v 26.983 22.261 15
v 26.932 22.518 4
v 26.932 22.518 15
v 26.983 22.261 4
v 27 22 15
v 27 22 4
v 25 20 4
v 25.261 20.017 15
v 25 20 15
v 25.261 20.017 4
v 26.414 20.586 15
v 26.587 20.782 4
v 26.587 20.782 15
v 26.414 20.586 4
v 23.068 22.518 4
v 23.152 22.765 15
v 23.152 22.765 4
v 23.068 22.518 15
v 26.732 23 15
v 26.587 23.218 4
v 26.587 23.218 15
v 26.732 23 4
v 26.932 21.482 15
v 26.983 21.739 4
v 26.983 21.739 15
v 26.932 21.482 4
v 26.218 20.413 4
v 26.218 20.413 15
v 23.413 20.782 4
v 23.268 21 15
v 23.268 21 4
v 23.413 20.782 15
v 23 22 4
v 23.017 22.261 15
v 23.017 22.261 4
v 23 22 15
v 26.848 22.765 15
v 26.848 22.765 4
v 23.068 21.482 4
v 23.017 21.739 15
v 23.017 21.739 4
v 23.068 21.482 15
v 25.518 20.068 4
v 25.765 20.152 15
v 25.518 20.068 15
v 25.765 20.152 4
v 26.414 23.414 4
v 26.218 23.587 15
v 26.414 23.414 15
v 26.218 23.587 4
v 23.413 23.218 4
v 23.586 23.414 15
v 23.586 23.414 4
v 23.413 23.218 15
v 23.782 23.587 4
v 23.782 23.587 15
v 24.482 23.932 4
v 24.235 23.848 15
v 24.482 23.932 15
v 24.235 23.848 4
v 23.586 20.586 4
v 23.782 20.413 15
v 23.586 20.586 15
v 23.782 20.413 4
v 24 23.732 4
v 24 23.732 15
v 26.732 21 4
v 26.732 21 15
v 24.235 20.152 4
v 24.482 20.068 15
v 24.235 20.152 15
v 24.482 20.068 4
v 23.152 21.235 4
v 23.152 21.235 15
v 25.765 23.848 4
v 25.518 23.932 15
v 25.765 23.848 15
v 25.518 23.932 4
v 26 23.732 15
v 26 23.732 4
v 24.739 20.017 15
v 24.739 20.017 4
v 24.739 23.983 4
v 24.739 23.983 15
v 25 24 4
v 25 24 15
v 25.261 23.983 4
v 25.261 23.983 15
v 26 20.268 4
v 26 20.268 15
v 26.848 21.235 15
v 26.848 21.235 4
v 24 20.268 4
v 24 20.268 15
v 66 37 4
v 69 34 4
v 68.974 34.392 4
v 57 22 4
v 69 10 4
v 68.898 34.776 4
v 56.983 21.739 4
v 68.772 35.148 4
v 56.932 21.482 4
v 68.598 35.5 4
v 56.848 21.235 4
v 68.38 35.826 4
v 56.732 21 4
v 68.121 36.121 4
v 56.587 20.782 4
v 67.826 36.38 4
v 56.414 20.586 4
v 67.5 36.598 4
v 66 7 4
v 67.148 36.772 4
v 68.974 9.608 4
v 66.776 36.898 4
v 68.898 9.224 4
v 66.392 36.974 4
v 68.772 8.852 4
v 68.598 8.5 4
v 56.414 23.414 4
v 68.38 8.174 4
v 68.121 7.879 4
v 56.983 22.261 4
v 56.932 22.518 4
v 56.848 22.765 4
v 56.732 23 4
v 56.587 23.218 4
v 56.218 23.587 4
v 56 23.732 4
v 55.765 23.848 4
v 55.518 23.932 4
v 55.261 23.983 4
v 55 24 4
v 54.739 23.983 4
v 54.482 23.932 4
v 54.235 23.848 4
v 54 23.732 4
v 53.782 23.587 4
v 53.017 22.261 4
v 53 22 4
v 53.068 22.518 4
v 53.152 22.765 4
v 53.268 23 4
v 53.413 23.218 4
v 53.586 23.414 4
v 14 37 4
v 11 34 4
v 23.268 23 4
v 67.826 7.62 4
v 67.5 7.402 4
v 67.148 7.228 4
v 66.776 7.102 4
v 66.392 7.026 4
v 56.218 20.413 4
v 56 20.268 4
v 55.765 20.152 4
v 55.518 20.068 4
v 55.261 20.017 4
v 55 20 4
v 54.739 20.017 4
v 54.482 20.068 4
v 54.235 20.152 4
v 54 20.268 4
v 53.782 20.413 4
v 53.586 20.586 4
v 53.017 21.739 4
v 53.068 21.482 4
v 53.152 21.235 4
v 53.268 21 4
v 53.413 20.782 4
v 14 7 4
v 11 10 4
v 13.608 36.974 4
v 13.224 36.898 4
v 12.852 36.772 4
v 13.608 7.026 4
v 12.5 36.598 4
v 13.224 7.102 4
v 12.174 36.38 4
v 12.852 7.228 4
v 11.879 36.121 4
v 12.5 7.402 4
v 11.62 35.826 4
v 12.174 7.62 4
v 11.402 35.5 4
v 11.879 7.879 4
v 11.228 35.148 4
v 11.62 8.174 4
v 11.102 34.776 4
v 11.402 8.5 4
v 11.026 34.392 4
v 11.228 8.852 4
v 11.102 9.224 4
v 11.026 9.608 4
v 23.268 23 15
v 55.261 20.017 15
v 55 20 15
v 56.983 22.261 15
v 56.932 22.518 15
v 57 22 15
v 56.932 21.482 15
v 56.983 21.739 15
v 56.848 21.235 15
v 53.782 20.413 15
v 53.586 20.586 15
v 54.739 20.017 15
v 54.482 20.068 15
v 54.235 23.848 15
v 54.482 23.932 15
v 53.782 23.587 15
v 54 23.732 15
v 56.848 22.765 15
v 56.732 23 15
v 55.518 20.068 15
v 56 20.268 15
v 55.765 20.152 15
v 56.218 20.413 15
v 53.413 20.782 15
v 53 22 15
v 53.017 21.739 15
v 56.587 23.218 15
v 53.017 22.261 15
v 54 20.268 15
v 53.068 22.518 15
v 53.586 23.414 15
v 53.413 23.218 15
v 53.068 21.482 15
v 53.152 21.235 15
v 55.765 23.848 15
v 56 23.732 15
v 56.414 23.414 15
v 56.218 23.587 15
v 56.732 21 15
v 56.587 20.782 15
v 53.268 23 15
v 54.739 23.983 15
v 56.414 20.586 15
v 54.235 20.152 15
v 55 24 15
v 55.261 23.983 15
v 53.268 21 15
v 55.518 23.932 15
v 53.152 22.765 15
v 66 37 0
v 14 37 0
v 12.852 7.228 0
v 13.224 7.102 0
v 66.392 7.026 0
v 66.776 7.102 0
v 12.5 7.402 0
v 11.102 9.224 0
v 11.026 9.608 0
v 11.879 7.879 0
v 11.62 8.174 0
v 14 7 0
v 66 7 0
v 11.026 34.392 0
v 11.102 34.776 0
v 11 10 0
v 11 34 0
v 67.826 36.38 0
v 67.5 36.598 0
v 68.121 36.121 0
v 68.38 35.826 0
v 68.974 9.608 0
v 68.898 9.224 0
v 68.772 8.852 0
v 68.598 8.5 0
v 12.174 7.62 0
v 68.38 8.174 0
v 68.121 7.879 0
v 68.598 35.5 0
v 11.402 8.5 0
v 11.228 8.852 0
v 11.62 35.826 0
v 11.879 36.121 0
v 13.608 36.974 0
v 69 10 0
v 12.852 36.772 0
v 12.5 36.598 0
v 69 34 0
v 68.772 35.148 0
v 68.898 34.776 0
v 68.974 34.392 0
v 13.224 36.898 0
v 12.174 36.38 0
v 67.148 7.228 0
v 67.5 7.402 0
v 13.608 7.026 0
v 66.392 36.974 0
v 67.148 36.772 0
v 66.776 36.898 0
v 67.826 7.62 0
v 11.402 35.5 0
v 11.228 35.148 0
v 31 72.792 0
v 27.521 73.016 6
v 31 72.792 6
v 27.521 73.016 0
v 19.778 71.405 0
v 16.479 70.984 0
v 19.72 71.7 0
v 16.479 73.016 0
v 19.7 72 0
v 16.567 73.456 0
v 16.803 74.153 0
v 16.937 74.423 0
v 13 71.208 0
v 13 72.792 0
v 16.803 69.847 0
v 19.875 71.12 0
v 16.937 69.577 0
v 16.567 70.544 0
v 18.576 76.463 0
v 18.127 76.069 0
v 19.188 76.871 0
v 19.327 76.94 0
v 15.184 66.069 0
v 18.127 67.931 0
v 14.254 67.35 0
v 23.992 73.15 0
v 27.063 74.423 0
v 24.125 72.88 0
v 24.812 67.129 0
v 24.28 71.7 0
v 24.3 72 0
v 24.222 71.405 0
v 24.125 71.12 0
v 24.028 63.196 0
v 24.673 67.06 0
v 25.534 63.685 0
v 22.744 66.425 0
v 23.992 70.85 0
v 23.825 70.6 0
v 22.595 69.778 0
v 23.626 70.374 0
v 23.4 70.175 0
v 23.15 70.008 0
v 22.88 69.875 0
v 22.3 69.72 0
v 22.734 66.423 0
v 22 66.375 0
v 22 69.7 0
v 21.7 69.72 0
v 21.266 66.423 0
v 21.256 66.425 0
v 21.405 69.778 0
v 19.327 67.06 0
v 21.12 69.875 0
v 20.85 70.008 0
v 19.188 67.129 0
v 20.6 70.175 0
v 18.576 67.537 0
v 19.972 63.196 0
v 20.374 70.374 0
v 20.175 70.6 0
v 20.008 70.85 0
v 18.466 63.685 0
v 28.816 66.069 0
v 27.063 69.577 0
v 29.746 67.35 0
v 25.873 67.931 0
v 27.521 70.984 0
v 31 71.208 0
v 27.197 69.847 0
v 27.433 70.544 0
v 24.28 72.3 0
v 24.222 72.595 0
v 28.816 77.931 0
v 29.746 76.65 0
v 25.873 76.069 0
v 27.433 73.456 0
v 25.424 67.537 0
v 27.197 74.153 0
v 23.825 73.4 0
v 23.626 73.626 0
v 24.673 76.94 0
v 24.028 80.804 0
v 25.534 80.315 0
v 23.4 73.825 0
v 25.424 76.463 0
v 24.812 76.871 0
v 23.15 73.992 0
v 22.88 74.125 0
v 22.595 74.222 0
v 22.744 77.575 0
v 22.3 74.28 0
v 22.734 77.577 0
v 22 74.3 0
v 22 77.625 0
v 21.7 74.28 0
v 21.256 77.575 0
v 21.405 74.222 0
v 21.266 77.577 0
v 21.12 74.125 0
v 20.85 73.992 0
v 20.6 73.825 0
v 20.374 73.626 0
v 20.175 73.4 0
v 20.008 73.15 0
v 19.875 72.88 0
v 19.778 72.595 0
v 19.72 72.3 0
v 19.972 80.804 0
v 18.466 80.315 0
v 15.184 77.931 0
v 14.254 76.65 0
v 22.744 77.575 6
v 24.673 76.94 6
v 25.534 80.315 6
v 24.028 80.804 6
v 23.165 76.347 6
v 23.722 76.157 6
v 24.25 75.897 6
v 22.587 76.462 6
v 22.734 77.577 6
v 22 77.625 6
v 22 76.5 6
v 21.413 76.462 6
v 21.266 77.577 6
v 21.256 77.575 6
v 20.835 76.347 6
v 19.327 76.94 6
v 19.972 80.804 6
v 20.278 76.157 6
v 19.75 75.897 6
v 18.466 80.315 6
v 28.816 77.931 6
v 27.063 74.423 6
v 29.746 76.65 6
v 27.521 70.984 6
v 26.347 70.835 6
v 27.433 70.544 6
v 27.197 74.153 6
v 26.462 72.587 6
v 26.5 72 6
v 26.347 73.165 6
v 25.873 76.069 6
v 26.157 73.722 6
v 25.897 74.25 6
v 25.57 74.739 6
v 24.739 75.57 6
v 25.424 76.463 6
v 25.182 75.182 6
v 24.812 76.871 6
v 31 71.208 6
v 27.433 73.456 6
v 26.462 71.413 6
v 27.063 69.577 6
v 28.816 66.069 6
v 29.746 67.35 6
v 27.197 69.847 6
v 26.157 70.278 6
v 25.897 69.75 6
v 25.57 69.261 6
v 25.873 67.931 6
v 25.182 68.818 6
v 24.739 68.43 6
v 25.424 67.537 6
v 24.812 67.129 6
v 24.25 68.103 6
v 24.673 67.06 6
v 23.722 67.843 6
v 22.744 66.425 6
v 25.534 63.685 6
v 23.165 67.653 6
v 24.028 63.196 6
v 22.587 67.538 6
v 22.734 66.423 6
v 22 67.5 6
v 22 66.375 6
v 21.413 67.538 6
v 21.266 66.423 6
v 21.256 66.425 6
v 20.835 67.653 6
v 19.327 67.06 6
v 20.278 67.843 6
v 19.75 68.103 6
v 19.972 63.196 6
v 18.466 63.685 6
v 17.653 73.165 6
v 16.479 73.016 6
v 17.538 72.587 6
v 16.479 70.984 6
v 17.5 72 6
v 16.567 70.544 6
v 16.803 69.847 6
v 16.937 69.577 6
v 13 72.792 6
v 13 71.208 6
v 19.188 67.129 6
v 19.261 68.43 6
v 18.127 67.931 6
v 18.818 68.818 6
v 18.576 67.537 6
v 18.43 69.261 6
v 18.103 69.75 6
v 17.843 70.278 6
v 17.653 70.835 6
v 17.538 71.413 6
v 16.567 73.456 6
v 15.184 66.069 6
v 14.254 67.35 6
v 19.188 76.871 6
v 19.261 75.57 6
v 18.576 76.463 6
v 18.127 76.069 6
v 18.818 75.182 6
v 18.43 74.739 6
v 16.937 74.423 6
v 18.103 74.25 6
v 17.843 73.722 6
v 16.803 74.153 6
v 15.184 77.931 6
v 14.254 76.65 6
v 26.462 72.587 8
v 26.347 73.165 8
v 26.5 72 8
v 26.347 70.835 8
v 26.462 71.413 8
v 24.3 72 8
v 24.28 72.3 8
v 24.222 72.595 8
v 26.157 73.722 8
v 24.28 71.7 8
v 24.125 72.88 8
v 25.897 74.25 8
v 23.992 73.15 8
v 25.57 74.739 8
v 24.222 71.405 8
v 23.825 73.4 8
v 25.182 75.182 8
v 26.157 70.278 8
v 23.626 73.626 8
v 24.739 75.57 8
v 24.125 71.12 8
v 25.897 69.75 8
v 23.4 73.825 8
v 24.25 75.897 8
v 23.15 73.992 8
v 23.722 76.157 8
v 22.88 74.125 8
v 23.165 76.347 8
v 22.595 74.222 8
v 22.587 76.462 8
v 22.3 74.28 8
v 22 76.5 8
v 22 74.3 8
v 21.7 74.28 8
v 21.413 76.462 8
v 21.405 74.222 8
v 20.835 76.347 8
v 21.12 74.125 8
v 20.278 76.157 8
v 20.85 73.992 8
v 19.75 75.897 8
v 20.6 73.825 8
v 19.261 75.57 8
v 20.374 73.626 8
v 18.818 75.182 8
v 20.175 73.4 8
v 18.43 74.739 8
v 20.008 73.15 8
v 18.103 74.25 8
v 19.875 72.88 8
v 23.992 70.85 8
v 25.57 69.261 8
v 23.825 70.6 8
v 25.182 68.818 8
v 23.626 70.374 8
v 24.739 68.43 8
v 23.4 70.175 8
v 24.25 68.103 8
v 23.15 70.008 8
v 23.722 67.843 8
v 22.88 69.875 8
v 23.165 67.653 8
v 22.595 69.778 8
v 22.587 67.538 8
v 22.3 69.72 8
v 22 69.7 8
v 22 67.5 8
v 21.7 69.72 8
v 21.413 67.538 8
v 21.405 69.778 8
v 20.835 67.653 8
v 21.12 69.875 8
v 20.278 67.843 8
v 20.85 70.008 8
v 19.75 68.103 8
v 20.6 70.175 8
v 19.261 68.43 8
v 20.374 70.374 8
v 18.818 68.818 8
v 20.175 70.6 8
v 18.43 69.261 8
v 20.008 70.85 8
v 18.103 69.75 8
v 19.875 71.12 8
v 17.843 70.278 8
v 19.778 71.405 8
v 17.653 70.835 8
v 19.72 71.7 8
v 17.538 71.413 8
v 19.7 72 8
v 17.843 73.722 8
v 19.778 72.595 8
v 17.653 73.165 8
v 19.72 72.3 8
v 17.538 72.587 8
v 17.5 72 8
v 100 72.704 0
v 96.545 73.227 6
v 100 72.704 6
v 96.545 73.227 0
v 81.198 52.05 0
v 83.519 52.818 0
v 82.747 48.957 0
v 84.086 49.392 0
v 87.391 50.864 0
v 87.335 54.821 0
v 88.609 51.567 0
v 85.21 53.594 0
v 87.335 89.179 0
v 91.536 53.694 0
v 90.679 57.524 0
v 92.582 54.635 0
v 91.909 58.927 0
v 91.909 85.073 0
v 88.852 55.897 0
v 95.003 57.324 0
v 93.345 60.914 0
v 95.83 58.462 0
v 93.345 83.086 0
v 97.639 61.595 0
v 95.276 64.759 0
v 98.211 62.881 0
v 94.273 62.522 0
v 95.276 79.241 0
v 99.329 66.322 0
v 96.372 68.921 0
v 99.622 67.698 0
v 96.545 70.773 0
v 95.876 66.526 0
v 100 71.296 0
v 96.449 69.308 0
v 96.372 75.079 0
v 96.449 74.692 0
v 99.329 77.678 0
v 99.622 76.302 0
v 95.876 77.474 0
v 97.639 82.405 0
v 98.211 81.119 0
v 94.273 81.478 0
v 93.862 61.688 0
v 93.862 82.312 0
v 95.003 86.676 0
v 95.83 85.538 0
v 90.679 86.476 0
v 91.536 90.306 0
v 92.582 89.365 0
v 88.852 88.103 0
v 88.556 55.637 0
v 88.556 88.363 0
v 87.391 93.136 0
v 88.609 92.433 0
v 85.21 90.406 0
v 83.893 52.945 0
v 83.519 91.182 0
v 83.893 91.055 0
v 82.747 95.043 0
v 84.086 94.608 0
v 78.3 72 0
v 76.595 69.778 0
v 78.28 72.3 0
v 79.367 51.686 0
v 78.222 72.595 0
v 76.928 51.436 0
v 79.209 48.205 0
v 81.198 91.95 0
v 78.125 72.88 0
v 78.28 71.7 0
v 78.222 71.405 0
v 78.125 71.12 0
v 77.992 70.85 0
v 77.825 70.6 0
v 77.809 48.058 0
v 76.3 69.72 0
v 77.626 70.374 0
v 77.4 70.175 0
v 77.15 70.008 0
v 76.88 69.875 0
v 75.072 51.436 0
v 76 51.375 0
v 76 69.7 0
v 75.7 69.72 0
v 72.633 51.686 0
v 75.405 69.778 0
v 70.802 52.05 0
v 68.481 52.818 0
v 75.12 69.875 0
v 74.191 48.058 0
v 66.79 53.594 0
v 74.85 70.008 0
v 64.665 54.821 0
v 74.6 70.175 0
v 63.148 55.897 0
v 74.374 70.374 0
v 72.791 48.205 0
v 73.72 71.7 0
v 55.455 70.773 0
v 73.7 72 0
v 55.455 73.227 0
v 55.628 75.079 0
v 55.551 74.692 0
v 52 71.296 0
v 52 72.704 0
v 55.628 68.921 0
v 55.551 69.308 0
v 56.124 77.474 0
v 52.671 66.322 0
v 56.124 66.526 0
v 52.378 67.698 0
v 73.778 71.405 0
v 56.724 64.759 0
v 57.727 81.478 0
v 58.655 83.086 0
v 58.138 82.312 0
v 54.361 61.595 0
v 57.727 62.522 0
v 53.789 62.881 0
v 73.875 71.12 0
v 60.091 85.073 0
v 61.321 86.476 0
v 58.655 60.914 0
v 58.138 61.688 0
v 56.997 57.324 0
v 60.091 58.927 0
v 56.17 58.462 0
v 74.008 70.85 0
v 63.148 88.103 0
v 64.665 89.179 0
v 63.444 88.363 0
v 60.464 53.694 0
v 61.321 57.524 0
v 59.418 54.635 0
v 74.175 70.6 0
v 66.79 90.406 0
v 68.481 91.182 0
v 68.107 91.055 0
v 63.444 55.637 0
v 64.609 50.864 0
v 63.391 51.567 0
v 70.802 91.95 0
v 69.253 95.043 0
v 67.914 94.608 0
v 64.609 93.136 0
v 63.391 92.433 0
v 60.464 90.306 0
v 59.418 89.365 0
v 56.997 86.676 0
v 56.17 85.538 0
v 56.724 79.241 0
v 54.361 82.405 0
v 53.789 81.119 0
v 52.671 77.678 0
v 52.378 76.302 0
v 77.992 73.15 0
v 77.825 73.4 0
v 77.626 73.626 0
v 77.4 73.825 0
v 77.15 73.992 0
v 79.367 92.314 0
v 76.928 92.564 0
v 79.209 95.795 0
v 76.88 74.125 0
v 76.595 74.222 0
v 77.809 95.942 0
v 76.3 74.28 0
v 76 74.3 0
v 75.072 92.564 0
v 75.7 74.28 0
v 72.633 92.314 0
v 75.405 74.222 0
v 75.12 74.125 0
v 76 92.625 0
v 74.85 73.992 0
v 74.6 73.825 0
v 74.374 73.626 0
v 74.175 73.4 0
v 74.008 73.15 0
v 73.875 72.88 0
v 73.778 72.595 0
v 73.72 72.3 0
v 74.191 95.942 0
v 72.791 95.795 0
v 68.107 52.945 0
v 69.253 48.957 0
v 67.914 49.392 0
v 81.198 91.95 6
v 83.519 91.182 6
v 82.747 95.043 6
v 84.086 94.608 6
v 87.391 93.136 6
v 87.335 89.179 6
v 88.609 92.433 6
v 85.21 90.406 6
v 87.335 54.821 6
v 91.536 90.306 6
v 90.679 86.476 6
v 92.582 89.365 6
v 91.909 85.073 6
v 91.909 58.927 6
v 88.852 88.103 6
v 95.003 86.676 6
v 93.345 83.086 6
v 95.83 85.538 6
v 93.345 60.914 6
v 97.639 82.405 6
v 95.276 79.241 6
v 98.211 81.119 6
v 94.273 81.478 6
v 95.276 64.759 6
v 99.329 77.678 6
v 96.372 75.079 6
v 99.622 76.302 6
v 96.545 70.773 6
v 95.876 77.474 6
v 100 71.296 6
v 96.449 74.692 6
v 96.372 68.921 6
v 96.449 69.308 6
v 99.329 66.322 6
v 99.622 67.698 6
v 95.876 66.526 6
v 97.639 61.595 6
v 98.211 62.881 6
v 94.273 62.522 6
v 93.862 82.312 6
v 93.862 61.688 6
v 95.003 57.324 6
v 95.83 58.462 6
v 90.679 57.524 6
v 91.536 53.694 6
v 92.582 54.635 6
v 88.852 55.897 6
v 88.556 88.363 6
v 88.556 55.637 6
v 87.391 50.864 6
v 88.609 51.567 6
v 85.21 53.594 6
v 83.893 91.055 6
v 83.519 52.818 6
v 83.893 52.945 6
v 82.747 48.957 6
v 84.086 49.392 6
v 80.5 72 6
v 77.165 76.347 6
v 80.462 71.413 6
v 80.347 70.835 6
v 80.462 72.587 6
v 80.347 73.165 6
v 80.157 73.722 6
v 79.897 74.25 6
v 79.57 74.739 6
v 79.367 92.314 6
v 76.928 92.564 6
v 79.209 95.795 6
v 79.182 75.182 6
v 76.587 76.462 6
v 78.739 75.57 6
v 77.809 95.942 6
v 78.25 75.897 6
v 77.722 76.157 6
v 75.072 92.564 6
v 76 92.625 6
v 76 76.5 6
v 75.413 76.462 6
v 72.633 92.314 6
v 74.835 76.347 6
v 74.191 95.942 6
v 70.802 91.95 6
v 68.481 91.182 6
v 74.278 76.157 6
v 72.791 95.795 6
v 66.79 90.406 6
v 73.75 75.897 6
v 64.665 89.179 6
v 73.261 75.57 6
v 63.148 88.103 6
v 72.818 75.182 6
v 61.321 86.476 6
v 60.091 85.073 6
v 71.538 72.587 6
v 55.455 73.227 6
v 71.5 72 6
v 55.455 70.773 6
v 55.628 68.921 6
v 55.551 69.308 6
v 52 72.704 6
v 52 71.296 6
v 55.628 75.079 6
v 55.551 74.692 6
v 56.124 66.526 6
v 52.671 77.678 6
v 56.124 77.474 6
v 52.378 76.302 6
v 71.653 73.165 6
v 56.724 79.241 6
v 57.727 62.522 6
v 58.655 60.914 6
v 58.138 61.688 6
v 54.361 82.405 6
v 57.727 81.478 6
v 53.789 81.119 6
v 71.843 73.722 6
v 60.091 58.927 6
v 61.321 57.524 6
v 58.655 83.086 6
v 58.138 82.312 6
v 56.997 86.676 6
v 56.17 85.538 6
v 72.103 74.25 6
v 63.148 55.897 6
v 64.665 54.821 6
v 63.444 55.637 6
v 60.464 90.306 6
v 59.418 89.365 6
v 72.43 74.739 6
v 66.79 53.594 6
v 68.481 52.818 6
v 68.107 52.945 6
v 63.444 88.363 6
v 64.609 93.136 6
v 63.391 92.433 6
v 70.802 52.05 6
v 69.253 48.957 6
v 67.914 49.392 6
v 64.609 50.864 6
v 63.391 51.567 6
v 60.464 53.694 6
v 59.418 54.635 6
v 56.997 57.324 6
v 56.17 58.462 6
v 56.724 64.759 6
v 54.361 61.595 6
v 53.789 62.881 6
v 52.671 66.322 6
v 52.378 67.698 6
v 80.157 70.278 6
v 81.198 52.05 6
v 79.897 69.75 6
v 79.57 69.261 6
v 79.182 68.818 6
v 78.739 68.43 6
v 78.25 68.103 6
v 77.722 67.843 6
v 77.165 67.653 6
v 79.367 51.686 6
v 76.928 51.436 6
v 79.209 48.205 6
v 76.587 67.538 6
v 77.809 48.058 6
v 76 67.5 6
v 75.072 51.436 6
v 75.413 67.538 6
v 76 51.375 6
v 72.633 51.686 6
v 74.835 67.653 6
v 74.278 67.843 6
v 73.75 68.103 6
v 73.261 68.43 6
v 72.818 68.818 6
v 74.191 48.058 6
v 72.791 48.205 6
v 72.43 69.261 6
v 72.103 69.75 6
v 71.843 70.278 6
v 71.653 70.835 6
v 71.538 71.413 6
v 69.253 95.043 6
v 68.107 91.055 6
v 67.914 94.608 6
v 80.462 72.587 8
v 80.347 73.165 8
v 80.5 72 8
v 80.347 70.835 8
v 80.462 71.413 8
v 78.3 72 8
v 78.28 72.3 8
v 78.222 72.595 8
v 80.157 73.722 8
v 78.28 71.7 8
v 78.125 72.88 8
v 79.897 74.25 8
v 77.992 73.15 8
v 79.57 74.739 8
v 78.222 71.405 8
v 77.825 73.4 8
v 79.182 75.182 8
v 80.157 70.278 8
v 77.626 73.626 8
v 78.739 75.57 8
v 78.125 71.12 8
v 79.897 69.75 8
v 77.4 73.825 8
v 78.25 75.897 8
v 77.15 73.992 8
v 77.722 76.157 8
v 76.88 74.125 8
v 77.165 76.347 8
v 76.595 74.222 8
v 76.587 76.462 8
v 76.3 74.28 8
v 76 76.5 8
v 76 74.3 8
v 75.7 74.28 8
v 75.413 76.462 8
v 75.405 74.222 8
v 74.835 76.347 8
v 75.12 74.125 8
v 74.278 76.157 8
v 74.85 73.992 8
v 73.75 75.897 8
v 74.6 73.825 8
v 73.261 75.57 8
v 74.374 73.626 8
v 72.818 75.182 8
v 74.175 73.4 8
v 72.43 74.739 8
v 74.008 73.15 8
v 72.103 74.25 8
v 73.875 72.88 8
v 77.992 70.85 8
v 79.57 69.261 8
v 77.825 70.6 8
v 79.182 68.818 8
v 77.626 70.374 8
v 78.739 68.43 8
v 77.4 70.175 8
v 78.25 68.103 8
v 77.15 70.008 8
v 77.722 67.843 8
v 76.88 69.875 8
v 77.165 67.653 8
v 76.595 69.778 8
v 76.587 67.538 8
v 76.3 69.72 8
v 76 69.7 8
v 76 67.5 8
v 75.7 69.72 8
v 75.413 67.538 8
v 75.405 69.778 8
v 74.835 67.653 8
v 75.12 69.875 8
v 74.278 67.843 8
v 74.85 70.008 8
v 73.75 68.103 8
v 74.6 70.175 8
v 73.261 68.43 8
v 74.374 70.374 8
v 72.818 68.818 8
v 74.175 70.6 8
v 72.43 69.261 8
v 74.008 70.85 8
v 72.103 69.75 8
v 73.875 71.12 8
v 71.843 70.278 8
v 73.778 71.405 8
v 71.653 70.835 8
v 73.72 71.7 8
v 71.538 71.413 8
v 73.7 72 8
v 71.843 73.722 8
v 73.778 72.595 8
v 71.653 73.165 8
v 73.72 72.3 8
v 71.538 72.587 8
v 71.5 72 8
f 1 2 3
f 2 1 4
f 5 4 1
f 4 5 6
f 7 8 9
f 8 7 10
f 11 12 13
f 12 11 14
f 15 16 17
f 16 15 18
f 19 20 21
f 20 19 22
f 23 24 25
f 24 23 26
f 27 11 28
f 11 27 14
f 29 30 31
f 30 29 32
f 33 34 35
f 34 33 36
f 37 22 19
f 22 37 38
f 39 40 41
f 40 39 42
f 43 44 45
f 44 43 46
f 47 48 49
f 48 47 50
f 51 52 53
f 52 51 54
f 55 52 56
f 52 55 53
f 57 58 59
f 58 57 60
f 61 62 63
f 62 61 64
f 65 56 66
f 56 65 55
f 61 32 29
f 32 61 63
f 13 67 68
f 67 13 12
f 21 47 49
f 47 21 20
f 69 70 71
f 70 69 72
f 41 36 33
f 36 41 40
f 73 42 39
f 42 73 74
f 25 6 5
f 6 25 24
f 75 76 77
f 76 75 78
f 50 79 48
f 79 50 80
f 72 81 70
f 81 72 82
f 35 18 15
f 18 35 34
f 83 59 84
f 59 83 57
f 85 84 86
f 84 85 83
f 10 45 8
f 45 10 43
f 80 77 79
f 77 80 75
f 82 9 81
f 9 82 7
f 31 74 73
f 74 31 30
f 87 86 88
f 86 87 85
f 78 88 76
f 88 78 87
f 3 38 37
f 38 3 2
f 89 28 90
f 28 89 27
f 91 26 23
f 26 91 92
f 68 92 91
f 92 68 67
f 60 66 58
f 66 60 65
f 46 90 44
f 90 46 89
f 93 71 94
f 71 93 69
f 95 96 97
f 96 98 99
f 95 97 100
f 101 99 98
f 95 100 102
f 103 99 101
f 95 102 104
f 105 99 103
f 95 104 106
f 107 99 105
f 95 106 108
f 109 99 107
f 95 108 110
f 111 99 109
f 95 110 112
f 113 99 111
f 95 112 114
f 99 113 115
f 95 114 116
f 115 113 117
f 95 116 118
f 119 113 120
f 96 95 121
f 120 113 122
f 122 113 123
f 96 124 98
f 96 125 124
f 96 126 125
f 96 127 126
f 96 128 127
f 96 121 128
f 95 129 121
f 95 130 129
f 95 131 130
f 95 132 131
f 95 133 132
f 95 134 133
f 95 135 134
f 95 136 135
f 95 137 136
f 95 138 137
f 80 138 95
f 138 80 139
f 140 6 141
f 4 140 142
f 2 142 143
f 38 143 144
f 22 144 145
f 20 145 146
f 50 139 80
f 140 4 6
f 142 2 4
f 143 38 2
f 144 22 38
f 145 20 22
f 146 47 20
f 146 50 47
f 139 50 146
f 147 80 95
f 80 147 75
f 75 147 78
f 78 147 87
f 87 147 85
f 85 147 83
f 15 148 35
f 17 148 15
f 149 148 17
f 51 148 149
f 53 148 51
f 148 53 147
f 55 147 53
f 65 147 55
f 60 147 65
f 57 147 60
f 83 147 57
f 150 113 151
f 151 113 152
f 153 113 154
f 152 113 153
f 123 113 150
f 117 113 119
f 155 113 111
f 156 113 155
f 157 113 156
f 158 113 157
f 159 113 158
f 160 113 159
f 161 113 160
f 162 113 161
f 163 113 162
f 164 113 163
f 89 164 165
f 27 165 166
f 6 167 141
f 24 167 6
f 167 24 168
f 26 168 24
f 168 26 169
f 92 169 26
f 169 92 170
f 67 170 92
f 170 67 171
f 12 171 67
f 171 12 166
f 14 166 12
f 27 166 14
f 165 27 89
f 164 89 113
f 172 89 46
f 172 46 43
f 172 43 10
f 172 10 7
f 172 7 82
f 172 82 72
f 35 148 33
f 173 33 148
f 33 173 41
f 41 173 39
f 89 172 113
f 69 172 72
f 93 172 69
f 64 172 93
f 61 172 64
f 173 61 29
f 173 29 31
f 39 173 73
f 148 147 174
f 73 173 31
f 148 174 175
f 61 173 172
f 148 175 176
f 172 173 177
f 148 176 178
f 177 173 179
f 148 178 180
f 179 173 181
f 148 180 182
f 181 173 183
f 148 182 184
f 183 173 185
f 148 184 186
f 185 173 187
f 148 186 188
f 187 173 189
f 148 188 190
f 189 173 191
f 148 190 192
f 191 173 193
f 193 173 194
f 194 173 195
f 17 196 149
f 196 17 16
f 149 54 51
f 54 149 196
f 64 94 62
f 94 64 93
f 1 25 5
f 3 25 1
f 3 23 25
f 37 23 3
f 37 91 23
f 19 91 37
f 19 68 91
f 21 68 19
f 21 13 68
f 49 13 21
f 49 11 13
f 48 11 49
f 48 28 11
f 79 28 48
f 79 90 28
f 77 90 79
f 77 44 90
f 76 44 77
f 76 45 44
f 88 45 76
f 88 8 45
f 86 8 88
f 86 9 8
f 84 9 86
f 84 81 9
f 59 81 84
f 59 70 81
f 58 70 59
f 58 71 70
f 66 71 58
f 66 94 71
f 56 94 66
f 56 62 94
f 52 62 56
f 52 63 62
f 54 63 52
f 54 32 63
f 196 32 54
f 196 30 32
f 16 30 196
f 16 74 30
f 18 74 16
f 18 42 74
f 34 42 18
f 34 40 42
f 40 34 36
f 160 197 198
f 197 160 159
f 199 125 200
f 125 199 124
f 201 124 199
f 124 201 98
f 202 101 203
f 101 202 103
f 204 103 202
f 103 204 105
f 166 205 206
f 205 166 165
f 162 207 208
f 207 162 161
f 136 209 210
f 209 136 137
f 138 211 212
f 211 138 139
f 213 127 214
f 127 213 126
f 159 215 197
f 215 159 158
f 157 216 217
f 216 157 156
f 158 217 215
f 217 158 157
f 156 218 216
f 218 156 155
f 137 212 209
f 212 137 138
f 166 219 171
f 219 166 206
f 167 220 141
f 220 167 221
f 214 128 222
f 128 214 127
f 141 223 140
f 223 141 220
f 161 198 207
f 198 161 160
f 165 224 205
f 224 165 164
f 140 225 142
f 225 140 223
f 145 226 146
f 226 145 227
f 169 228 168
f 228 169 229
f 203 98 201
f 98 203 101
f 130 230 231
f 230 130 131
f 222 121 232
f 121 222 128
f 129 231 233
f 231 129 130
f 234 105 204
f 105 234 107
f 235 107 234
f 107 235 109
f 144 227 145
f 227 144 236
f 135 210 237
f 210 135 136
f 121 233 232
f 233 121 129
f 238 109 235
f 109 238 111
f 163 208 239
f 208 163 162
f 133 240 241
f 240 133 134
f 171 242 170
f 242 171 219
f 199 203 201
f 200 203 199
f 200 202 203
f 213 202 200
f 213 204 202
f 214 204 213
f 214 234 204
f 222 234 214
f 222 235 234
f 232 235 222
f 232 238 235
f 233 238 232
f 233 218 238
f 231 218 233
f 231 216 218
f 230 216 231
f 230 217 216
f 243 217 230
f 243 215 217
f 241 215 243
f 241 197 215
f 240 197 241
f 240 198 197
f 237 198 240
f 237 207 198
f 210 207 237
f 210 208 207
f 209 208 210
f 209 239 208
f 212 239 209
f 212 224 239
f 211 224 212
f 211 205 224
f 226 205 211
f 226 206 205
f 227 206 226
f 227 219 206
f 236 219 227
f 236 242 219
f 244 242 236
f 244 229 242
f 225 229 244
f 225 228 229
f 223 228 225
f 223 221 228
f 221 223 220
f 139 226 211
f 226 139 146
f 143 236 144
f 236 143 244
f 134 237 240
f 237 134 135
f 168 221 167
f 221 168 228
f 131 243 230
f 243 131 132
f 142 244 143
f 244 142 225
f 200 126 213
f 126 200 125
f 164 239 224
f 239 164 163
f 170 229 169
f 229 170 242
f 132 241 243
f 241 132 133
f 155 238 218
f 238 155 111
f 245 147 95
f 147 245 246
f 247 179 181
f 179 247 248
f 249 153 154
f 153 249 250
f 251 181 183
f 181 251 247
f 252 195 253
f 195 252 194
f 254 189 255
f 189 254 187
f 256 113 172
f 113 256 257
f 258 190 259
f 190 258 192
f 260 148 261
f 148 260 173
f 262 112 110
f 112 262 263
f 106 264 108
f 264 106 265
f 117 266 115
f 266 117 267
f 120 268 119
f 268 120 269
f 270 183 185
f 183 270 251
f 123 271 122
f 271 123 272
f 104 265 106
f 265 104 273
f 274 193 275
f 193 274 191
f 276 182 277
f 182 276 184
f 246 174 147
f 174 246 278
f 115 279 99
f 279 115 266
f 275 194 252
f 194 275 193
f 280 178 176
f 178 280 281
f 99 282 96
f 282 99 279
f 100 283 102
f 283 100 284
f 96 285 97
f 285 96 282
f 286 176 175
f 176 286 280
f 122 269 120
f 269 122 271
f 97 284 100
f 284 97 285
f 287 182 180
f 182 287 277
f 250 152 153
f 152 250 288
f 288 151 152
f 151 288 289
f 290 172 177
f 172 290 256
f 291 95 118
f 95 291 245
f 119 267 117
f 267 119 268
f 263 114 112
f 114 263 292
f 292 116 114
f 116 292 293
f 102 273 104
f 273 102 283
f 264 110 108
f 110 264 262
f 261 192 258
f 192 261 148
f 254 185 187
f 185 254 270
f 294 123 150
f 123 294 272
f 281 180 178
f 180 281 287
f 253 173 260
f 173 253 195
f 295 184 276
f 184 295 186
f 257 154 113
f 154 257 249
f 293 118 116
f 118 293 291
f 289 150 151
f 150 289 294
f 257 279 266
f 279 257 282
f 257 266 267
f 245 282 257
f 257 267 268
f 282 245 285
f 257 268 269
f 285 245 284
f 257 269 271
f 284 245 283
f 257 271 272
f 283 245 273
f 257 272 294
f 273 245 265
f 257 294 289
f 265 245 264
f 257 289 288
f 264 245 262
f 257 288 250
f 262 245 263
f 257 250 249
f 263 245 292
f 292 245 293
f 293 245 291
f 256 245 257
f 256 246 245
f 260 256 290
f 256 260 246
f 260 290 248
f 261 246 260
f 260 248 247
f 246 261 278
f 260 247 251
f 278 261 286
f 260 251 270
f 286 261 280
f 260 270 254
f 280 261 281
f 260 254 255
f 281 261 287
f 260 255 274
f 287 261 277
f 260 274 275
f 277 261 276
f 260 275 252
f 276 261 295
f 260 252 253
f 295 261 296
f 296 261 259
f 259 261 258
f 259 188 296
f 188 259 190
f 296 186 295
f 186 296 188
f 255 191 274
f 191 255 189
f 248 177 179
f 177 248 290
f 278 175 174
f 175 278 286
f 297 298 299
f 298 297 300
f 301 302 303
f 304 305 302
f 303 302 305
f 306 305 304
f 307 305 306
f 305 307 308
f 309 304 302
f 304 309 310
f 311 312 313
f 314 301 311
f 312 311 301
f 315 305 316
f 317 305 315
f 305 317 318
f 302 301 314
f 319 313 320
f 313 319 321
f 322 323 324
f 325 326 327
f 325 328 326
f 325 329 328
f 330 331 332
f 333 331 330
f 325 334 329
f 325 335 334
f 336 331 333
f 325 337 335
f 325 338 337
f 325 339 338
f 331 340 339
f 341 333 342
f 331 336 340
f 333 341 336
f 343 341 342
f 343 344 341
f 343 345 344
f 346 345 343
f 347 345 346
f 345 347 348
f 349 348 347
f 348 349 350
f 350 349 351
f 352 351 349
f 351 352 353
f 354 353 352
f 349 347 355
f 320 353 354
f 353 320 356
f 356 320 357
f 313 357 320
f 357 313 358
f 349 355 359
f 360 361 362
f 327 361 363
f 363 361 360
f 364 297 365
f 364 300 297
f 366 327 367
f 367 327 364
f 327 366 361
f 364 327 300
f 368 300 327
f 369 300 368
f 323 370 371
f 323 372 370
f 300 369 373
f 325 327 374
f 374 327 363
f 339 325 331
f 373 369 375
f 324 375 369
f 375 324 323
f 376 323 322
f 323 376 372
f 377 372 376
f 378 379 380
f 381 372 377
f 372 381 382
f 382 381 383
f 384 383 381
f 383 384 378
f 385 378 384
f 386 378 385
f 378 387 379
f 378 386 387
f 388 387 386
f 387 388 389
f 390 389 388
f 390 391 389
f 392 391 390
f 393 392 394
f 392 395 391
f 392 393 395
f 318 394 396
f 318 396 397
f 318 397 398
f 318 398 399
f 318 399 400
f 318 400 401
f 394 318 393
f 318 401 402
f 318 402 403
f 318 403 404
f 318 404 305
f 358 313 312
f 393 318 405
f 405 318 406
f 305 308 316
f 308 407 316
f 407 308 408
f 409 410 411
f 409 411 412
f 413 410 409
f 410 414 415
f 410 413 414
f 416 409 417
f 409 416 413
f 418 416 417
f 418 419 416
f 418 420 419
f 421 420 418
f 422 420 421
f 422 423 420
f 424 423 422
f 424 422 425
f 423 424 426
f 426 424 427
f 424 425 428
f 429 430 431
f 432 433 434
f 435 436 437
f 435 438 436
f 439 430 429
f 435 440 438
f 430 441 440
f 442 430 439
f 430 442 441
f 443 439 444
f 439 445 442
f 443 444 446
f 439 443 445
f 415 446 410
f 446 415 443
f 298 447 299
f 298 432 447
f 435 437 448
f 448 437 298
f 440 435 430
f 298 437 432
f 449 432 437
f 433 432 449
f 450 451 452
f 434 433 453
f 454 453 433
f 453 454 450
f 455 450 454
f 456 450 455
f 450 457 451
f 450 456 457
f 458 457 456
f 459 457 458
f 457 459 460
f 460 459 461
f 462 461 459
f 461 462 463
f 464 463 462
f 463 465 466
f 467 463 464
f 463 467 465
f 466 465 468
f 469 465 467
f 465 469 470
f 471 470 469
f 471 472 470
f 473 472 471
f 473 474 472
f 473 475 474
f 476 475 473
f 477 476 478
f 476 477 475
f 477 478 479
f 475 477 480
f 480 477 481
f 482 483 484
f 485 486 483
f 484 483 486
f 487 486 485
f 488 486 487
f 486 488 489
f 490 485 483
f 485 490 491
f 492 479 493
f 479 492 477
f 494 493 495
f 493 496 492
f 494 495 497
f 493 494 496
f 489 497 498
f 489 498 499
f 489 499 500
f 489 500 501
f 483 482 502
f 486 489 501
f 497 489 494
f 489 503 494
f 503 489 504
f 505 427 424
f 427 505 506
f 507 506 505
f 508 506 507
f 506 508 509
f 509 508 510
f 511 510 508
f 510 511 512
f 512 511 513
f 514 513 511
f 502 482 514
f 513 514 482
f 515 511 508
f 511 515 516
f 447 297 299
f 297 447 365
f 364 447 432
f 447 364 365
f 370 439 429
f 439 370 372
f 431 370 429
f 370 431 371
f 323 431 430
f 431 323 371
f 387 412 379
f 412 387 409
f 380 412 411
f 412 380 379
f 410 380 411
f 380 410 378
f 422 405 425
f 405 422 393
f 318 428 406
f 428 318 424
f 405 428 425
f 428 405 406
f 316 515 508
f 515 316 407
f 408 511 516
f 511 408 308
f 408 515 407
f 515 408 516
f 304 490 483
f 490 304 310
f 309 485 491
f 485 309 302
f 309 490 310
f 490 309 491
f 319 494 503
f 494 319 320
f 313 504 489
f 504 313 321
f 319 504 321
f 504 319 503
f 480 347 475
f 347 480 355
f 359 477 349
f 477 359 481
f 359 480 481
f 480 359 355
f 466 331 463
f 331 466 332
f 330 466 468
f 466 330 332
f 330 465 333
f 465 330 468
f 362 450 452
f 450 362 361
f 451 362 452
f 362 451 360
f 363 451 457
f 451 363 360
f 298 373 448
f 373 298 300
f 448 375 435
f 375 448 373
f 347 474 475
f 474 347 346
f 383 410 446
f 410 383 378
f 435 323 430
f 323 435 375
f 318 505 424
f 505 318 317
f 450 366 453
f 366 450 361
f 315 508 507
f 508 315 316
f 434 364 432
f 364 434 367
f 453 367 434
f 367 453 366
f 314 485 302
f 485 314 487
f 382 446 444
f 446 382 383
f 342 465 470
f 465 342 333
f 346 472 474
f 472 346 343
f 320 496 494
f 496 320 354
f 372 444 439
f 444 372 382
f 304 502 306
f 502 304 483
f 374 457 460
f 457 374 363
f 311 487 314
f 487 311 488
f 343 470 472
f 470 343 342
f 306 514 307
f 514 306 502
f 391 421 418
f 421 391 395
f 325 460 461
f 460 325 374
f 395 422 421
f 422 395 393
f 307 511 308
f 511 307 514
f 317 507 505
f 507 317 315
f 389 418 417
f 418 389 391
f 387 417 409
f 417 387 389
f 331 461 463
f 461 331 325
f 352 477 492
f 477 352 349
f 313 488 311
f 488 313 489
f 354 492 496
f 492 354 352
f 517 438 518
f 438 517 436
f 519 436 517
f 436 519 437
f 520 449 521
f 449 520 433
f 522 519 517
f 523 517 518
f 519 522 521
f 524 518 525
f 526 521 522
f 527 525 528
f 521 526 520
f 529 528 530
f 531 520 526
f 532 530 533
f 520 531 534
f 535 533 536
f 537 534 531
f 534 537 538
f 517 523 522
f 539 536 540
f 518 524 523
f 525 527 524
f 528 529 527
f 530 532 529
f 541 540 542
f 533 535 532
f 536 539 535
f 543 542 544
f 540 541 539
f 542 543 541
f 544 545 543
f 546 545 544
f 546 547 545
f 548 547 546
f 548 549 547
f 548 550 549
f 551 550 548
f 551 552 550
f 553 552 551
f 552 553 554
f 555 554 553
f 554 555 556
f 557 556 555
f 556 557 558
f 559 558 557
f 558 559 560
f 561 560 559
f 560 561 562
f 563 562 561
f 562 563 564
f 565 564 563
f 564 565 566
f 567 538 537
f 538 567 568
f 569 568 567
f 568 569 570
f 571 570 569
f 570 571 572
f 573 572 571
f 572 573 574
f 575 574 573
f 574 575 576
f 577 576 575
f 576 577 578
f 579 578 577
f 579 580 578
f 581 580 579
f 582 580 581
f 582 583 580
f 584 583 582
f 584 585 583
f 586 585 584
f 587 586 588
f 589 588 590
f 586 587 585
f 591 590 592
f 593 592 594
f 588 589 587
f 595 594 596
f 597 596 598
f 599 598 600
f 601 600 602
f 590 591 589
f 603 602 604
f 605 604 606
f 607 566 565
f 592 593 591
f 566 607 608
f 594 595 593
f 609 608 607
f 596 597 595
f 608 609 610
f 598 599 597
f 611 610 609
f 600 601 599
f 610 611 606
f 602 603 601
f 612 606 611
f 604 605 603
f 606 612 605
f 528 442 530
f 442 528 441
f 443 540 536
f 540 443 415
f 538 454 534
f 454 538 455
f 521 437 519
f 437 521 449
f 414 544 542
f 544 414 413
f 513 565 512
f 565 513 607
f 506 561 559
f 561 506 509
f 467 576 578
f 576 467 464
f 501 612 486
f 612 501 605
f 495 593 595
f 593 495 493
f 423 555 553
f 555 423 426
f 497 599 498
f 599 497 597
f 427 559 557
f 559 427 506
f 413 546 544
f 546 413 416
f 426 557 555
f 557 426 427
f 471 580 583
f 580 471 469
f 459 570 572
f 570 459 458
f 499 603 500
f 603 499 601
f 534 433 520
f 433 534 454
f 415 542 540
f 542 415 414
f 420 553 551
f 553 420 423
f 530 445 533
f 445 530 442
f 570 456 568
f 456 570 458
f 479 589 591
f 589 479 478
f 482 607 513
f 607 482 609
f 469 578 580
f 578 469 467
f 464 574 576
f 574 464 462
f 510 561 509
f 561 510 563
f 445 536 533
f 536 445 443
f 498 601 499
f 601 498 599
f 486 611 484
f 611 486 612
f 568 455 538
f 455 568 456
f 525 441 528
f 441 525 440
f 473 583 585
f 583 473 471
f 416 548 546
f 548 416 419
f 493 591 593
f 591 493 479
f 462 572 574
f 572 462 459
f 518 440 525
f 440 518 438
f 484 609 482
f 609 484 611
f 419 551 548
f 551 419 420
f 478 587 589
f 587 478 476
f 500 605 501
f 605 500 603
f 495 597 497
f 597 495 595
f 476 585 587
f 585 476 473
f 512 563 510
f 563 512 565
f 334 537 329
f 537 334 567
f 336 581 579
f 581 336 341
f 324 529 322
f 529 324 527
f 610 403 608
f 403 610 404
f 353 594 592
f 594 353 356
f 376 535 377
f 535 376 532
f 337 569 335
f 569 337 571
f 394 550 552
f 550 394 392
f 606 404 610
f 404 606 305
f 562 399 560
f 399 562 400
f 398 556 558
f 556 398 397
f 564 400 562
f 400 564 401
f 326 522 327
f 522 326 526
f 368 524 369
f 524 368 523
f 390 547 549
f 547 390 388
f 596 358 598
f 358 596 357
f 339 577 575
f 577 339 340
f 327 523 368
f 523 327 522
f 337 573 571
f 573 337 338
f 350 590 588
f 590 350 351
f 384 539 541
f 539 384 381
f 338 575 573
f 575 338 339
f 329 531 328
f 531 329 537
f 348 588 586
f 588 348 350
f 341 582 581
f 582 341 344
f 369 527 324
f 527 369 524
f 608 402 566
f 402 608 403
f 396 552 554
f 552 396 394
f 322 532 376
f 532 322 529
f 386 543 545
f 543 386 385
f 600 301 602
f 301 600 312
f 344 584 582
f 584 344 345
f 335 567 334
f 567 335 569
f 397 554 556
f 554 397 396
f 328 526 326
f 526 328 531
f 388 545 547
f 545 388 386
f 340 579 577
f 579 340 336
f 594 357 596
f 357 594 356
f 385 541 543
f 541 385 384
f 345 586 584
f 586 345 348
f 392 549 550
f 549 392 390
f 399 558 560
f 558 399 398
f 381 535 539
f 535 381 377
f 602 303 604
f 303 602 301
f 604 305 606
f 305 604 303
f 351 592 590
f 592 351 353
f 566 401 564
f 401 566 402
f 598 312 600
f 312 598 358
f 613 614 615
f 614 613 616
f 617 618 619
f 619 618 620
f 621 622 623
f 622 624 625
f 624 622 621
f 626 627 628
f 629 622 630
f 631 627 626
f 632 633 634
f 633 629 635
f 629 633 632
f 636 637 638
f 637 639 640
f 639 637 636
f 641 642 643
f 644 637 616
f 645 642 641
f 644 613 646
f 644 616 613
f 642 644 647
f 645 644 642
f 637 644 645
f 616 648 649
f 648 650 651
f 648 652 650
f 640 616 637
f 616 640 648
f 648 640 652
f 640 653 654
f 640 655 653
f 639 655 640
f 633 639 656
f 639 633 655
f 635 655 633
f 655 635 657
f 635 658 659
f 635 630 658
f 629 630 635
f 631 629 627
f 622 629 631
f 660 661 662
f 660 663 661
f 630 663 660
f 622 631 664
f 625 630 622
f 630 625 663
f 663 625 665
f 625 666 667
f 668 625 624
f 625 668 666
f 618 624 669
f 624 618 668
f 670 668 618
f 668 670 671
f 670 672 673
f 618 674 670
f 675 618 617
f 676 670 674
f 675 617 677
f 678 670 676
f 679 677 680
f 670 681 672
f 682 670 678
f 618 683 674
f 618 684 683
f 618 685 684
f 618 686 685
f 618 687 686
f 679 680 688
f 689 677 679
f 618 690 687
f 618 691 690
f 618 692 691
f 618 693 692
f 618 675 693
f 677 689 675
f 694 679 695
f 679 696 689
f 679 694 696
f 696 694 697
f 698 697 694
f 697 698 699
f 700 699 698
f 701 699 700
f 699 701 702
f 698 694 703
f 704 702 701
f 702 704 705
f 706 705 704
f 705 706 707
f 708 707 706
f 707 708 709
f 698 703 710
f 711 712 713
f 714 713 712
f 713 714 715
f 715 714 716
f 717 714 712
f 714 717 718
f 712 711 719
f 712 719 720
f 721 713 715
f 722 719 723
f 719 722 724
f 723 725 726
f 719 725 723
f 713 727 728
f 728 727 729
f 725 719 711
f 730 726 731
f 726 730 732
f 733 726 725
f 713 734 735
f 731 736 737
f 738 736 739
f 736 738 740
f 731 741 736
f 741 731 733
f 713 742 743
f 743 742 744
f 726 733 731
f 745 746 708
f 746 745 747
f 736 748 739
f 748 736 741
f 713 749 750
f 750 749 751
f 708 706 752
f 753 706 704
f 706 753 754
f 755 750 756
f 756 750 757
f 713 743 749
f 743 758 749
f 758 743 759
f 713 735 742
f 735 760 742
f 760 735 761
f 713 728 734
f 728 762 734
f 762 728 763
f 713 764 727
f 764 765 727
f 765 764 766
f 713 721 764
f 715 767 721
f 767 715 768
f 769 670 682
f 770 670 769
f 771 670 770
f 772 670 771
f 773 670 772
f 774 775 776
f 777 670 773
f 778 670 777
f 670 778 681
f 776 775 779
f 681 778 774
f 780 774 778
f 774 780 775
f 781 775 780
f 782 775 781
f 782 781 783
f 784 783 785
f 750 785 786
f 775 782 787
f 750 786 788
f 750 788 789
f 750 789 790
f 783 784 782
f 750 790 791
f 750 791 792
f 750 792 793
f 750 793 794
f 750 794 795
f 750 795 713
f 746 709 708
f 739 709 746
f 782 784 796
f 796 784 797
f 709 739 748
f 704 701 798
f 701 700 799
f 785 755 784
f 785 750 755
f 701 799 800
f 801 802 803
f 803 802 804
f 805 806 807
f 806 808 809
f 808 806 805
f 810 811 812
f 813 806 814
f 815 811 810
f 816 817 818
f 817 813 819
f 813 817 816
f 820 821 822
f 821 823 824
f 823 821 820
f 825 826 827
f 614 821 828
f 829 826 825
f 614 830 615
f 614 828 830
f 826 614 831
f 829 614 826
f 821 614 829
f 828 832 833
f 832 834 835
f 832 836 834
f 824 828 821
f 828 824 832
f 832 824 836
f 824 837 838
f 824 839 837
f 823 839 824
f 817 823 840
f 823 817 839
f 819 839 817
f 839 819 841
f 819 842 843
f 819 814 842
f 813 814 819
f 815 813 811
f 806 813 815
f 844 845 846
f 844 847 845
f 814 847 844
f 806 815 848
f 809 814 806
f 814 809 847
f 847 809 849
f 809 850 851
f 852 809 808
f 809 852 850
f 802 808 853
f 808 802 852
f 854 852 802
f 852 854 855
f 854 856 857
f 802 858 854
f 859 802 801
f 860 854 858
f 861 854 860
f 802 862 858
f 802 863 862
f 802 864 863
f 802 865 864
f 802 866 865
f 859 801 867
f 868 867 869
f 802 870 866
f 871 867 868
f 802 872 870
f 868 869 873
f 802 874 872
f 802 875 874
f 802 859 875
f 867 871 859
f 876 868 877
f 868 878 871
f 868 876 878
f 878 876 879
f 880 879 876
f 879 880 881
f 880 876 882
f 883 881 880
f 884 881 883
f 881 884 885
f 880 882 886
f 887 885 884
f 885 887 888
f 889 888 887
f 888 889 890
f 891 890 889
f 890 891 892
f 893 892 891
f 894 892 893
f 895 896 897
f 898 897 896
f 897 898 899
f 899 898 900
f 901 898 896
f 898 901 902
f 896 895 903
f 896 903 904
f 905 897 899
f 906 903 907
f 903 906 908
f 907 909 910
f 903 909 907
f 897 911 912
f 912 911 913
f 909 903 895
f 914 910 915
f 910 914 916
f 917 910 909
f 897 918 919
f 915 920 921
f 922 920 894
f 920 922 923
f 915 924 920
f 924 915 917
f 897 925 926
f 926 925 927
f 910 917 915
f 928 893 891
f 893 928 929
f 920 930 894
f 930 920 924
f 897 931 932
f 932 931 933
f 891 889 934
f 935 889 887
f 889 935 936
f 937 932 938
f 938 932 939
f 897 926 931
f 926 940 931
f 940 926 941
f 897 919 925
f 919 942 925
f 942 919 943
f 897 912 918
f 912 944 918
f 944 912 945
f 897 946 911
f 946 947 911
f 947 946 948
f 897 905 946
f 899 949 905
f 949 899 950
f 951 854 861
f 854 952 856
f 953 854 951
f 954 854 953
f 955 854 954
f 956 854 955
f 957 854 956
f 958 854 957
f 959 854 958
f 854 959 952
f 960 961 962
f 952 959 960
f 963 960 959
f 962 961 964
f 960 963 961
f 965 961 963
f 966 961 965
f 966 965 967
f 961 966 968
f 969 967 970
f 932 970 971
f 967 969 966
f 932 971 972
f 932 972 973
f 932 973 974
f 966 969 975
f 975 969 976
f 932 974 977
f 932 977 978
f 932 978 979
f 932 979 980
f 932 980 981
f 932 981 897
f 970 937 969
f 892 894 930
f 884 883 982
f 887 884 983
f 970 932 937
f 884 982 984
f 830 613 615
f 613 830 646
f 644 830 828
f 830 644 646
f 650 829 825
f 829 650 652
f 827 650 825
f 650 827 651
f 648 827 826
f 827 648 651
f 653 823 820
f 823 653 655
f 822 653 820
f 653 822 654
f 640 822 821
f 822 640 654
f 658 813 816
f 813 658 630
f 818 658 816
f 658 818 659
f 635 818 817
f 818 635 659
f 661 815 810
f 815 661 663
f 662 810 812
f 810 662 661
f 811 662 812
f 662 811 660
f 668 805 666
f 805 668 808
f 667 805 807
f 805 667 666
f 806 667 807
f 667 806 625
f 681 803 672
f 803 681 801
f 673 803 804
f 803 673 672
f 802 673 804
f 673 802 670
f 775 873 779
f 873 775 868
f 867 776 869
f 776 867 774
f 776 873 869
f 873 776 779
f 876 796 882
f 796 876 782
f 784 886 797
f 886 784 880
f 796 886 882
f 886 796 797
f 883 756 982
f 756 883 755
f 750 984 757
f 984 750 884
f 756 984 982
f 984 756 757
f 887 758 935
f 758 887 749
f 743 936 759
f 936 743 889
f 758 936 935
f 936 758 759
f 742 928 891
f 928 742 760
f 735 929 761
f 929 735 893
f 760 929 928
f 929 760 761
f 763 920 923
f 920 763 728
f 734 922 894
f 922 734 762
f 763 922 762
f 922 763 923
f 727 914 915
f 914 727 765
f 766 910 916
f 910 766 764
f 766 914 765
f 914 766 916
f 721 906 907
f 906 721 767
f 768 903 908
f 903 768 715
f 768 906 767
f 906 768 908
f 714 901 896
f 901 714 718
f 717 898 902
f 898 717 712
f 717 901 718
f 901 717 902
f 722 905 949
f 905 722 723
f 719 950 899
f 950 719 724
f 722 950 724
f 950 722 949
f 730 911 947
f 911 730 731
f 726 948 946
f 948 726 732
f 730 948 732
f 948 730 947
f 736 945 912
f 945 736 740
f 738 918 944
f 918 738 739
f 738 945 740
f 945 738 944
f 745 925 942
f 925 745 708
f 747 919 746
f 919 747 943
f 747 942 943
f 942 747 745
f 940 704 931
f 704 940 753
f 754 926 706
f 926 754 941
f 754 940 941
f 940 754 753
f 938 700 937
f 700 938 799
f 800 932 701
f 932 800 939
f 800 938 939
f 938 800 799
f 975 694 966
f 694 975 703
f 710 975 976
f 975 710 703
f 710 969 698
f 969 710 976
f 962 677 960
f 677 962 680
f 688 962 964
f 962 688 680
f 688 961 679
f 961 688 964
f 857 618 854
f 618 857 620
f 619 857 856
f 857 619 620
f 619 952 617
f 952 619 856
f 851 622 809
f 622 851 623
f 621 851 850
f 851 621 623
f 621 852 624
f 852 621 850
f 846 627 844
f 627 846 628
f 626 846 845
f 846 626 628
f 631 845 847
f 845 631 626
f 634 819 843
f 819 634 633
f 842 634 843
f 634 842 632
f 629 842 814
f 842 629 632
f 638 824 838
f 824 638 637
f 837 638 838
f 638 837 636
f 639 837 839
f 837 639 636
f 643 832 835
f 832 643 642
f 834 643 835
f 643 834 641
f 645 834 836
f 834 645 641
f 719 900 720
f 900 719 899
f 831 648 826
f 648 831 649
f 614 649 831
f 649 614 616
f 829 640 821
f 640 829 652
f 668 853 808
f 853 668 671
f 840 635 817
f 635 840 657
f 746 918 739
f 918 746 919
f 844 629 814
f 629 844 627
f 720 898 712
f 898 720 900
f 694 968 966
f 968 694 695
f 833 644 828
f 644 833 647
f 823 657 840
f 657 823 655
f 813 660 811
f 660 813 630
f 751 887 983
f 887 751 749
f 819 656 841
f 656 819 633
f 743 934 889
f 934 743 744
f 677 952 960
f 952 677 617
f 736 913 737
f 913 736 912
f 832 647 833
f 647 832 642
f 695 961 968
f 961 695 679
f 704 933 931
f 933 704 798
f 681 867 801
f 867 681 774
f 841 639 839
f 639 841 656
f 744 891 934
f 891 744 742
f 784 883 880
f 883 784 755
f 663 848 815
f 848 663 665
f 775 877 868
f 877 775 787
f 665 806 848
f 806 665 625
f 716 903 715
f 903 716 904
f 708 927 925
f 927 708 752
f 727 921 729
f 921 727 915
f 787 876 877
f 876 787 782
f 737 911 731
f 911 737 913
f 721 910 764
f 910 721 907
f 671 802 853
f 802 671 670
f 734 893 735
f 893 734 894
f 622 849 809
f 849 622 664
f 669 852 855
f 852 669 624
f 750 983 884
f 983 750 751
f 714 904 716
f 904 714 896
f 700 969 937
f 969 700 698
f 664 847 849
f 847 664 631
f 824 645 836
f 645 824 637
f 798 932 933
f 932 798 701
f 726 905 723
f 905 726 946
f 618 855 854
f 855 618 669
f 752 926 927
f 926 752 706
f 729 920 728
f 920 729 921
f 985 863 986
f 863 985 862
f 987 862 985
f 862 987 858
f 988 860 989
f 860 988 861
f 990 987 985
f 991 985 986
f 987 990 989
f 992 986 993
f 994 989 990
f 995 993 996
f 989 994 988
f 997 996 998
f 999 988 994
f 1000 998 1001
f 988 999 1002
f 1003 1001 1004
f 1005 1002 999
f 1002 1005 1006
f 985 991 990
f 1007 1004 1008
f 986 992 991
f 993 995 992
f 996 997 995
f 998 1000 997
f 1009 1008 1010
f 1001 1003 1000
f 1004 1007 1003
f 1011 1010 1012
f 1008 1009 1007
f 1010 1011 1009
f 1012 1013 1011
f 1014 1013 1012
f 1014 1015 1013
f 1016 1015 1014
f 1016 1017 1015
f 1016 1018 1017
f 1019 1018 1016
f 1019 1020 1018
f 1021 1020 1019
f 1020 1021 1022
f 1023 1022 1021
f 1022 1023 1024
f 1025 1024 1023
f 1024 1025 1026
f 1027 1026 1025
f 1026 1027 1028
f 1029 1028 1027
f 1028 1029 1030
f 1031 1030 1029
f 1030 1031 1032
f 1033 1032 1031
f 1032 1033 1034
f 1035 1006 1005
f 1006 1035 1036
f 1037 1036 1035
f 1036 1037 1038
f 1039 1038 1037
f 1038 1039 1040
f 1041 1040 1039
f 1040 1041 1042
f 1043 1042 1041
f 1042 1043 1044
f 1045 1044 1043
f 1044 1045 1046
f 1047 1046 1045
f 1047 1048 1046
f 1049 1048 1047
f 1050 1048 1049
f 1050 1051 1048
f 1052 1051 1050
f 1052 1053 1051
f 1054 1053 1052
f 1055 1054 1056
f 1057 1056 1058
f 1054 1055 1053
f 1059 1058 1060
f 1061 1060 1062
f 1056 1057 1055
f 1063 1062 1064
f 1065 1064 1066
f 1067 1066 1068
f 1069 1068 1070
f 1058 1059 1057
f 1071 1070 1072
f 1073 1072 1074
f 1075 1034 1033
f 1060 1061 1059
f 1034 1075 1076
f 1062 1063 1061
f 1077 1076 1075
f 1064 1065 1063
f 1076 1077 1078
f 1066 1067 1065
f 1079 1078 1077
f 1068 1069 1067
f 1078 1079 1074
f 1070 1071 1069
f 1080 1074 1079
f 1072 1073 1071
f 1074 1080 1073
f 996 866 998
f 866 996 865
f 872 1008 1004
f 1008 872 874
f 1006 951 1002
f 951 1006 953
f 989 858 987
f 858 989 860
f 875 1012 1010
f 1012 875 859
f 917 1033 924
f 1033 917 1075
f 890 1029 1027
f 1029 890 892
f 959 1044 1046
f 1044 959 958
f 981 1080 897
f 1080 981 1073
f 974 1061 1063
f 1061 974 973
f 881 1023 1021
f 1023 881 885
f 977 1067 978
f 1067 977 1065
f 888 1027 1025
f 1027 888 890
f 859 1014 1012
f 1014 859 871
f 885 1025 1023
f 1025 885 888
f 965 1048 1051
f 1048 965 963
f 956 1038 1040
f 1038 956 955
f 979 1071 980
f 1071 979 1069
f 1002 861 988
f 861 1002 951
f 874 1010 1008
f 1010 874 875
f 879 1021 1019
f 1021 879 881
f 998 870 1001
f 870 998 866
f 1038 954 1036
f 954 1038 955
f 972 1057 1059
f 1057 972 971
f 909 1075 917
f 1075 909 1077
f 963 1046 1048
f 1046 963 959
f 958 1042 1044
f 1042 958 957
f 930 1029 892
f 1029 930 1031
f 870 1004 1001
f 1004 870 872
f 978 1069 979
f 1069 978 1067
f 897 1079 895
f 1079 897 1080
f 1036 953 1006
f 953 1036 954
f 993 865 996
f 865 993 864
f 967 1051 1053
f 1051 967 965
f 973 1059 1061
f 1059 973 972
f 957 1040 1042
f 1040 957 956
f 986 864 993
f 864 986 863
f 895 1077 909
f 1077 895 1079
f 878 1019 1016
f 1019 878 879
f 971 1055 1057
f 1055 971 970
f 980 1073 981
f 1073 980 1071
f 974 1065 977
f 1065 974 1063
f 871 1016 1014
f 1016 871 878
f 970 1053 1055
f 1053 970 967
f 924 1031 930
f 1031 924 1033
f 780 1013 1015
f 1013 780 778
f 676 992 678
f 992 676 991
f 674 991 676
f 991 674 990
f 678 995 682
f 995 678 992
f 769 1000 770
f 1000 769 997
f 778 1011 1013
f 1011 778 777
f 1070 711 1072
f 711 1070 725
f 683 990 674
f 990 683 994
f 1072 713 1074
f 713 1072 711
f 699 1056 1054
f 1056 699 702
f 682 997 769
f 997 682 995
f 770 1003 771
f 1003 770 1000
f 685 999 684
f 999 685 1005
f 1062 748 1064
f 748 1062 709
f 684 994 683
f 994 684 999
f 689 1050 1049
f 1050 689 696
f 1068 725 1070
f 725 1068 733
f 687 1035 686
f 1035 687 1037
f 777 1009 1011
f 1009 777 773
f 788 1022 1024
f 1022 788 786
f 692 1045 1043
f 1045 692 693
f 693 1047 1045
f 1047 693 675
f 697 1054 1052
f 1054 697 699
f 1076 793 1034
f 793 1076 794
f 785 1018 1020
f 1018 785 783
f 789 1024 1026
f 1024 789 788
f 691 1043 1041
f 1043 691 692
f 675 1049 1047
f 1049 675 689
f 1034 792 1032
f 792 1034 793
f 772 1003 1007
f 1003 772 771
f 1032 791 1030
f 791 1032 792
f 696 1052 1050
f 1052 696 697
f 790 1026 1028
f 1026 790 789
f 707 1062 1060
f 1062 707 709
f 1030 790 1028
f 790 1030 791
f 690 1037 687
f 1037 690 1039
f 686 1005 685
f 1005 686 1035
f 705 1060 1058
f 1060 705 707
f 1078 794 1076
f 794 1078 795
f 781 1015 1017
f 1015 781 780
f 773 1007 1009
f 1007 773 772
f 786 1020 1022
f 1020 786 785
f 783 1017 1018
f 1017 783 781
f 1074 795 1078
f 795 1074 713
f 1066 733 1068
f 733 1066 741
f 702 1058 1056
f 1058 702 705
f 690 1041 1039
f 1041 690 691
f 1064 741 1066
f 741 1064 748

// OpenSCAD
/*
Sample 104: Stirnradpaar auf Stiftbasis — 1:3
Generated from the FDM Mechanical Sample Library.
Units: millimetres.

Override examples:
  openscad -o custom.stl -D 'view="plate"' -D 'render_fn=64' model.scad
  openscad -o preview.png -D 'view="assembly"' model.scad
*/
use <../../../library/fdm_mechanisms.scad>

render_fn = is_undef(render_fn) ? 48 : render_fn;
view = is_undef(view) ? "plate" : view;
$fn = render_fn;

sample_spur_gears(
    view=view,
    teeth_a=10,
    teeth_b=30,
    module_size=1.5,
    clearance=0.3
);
